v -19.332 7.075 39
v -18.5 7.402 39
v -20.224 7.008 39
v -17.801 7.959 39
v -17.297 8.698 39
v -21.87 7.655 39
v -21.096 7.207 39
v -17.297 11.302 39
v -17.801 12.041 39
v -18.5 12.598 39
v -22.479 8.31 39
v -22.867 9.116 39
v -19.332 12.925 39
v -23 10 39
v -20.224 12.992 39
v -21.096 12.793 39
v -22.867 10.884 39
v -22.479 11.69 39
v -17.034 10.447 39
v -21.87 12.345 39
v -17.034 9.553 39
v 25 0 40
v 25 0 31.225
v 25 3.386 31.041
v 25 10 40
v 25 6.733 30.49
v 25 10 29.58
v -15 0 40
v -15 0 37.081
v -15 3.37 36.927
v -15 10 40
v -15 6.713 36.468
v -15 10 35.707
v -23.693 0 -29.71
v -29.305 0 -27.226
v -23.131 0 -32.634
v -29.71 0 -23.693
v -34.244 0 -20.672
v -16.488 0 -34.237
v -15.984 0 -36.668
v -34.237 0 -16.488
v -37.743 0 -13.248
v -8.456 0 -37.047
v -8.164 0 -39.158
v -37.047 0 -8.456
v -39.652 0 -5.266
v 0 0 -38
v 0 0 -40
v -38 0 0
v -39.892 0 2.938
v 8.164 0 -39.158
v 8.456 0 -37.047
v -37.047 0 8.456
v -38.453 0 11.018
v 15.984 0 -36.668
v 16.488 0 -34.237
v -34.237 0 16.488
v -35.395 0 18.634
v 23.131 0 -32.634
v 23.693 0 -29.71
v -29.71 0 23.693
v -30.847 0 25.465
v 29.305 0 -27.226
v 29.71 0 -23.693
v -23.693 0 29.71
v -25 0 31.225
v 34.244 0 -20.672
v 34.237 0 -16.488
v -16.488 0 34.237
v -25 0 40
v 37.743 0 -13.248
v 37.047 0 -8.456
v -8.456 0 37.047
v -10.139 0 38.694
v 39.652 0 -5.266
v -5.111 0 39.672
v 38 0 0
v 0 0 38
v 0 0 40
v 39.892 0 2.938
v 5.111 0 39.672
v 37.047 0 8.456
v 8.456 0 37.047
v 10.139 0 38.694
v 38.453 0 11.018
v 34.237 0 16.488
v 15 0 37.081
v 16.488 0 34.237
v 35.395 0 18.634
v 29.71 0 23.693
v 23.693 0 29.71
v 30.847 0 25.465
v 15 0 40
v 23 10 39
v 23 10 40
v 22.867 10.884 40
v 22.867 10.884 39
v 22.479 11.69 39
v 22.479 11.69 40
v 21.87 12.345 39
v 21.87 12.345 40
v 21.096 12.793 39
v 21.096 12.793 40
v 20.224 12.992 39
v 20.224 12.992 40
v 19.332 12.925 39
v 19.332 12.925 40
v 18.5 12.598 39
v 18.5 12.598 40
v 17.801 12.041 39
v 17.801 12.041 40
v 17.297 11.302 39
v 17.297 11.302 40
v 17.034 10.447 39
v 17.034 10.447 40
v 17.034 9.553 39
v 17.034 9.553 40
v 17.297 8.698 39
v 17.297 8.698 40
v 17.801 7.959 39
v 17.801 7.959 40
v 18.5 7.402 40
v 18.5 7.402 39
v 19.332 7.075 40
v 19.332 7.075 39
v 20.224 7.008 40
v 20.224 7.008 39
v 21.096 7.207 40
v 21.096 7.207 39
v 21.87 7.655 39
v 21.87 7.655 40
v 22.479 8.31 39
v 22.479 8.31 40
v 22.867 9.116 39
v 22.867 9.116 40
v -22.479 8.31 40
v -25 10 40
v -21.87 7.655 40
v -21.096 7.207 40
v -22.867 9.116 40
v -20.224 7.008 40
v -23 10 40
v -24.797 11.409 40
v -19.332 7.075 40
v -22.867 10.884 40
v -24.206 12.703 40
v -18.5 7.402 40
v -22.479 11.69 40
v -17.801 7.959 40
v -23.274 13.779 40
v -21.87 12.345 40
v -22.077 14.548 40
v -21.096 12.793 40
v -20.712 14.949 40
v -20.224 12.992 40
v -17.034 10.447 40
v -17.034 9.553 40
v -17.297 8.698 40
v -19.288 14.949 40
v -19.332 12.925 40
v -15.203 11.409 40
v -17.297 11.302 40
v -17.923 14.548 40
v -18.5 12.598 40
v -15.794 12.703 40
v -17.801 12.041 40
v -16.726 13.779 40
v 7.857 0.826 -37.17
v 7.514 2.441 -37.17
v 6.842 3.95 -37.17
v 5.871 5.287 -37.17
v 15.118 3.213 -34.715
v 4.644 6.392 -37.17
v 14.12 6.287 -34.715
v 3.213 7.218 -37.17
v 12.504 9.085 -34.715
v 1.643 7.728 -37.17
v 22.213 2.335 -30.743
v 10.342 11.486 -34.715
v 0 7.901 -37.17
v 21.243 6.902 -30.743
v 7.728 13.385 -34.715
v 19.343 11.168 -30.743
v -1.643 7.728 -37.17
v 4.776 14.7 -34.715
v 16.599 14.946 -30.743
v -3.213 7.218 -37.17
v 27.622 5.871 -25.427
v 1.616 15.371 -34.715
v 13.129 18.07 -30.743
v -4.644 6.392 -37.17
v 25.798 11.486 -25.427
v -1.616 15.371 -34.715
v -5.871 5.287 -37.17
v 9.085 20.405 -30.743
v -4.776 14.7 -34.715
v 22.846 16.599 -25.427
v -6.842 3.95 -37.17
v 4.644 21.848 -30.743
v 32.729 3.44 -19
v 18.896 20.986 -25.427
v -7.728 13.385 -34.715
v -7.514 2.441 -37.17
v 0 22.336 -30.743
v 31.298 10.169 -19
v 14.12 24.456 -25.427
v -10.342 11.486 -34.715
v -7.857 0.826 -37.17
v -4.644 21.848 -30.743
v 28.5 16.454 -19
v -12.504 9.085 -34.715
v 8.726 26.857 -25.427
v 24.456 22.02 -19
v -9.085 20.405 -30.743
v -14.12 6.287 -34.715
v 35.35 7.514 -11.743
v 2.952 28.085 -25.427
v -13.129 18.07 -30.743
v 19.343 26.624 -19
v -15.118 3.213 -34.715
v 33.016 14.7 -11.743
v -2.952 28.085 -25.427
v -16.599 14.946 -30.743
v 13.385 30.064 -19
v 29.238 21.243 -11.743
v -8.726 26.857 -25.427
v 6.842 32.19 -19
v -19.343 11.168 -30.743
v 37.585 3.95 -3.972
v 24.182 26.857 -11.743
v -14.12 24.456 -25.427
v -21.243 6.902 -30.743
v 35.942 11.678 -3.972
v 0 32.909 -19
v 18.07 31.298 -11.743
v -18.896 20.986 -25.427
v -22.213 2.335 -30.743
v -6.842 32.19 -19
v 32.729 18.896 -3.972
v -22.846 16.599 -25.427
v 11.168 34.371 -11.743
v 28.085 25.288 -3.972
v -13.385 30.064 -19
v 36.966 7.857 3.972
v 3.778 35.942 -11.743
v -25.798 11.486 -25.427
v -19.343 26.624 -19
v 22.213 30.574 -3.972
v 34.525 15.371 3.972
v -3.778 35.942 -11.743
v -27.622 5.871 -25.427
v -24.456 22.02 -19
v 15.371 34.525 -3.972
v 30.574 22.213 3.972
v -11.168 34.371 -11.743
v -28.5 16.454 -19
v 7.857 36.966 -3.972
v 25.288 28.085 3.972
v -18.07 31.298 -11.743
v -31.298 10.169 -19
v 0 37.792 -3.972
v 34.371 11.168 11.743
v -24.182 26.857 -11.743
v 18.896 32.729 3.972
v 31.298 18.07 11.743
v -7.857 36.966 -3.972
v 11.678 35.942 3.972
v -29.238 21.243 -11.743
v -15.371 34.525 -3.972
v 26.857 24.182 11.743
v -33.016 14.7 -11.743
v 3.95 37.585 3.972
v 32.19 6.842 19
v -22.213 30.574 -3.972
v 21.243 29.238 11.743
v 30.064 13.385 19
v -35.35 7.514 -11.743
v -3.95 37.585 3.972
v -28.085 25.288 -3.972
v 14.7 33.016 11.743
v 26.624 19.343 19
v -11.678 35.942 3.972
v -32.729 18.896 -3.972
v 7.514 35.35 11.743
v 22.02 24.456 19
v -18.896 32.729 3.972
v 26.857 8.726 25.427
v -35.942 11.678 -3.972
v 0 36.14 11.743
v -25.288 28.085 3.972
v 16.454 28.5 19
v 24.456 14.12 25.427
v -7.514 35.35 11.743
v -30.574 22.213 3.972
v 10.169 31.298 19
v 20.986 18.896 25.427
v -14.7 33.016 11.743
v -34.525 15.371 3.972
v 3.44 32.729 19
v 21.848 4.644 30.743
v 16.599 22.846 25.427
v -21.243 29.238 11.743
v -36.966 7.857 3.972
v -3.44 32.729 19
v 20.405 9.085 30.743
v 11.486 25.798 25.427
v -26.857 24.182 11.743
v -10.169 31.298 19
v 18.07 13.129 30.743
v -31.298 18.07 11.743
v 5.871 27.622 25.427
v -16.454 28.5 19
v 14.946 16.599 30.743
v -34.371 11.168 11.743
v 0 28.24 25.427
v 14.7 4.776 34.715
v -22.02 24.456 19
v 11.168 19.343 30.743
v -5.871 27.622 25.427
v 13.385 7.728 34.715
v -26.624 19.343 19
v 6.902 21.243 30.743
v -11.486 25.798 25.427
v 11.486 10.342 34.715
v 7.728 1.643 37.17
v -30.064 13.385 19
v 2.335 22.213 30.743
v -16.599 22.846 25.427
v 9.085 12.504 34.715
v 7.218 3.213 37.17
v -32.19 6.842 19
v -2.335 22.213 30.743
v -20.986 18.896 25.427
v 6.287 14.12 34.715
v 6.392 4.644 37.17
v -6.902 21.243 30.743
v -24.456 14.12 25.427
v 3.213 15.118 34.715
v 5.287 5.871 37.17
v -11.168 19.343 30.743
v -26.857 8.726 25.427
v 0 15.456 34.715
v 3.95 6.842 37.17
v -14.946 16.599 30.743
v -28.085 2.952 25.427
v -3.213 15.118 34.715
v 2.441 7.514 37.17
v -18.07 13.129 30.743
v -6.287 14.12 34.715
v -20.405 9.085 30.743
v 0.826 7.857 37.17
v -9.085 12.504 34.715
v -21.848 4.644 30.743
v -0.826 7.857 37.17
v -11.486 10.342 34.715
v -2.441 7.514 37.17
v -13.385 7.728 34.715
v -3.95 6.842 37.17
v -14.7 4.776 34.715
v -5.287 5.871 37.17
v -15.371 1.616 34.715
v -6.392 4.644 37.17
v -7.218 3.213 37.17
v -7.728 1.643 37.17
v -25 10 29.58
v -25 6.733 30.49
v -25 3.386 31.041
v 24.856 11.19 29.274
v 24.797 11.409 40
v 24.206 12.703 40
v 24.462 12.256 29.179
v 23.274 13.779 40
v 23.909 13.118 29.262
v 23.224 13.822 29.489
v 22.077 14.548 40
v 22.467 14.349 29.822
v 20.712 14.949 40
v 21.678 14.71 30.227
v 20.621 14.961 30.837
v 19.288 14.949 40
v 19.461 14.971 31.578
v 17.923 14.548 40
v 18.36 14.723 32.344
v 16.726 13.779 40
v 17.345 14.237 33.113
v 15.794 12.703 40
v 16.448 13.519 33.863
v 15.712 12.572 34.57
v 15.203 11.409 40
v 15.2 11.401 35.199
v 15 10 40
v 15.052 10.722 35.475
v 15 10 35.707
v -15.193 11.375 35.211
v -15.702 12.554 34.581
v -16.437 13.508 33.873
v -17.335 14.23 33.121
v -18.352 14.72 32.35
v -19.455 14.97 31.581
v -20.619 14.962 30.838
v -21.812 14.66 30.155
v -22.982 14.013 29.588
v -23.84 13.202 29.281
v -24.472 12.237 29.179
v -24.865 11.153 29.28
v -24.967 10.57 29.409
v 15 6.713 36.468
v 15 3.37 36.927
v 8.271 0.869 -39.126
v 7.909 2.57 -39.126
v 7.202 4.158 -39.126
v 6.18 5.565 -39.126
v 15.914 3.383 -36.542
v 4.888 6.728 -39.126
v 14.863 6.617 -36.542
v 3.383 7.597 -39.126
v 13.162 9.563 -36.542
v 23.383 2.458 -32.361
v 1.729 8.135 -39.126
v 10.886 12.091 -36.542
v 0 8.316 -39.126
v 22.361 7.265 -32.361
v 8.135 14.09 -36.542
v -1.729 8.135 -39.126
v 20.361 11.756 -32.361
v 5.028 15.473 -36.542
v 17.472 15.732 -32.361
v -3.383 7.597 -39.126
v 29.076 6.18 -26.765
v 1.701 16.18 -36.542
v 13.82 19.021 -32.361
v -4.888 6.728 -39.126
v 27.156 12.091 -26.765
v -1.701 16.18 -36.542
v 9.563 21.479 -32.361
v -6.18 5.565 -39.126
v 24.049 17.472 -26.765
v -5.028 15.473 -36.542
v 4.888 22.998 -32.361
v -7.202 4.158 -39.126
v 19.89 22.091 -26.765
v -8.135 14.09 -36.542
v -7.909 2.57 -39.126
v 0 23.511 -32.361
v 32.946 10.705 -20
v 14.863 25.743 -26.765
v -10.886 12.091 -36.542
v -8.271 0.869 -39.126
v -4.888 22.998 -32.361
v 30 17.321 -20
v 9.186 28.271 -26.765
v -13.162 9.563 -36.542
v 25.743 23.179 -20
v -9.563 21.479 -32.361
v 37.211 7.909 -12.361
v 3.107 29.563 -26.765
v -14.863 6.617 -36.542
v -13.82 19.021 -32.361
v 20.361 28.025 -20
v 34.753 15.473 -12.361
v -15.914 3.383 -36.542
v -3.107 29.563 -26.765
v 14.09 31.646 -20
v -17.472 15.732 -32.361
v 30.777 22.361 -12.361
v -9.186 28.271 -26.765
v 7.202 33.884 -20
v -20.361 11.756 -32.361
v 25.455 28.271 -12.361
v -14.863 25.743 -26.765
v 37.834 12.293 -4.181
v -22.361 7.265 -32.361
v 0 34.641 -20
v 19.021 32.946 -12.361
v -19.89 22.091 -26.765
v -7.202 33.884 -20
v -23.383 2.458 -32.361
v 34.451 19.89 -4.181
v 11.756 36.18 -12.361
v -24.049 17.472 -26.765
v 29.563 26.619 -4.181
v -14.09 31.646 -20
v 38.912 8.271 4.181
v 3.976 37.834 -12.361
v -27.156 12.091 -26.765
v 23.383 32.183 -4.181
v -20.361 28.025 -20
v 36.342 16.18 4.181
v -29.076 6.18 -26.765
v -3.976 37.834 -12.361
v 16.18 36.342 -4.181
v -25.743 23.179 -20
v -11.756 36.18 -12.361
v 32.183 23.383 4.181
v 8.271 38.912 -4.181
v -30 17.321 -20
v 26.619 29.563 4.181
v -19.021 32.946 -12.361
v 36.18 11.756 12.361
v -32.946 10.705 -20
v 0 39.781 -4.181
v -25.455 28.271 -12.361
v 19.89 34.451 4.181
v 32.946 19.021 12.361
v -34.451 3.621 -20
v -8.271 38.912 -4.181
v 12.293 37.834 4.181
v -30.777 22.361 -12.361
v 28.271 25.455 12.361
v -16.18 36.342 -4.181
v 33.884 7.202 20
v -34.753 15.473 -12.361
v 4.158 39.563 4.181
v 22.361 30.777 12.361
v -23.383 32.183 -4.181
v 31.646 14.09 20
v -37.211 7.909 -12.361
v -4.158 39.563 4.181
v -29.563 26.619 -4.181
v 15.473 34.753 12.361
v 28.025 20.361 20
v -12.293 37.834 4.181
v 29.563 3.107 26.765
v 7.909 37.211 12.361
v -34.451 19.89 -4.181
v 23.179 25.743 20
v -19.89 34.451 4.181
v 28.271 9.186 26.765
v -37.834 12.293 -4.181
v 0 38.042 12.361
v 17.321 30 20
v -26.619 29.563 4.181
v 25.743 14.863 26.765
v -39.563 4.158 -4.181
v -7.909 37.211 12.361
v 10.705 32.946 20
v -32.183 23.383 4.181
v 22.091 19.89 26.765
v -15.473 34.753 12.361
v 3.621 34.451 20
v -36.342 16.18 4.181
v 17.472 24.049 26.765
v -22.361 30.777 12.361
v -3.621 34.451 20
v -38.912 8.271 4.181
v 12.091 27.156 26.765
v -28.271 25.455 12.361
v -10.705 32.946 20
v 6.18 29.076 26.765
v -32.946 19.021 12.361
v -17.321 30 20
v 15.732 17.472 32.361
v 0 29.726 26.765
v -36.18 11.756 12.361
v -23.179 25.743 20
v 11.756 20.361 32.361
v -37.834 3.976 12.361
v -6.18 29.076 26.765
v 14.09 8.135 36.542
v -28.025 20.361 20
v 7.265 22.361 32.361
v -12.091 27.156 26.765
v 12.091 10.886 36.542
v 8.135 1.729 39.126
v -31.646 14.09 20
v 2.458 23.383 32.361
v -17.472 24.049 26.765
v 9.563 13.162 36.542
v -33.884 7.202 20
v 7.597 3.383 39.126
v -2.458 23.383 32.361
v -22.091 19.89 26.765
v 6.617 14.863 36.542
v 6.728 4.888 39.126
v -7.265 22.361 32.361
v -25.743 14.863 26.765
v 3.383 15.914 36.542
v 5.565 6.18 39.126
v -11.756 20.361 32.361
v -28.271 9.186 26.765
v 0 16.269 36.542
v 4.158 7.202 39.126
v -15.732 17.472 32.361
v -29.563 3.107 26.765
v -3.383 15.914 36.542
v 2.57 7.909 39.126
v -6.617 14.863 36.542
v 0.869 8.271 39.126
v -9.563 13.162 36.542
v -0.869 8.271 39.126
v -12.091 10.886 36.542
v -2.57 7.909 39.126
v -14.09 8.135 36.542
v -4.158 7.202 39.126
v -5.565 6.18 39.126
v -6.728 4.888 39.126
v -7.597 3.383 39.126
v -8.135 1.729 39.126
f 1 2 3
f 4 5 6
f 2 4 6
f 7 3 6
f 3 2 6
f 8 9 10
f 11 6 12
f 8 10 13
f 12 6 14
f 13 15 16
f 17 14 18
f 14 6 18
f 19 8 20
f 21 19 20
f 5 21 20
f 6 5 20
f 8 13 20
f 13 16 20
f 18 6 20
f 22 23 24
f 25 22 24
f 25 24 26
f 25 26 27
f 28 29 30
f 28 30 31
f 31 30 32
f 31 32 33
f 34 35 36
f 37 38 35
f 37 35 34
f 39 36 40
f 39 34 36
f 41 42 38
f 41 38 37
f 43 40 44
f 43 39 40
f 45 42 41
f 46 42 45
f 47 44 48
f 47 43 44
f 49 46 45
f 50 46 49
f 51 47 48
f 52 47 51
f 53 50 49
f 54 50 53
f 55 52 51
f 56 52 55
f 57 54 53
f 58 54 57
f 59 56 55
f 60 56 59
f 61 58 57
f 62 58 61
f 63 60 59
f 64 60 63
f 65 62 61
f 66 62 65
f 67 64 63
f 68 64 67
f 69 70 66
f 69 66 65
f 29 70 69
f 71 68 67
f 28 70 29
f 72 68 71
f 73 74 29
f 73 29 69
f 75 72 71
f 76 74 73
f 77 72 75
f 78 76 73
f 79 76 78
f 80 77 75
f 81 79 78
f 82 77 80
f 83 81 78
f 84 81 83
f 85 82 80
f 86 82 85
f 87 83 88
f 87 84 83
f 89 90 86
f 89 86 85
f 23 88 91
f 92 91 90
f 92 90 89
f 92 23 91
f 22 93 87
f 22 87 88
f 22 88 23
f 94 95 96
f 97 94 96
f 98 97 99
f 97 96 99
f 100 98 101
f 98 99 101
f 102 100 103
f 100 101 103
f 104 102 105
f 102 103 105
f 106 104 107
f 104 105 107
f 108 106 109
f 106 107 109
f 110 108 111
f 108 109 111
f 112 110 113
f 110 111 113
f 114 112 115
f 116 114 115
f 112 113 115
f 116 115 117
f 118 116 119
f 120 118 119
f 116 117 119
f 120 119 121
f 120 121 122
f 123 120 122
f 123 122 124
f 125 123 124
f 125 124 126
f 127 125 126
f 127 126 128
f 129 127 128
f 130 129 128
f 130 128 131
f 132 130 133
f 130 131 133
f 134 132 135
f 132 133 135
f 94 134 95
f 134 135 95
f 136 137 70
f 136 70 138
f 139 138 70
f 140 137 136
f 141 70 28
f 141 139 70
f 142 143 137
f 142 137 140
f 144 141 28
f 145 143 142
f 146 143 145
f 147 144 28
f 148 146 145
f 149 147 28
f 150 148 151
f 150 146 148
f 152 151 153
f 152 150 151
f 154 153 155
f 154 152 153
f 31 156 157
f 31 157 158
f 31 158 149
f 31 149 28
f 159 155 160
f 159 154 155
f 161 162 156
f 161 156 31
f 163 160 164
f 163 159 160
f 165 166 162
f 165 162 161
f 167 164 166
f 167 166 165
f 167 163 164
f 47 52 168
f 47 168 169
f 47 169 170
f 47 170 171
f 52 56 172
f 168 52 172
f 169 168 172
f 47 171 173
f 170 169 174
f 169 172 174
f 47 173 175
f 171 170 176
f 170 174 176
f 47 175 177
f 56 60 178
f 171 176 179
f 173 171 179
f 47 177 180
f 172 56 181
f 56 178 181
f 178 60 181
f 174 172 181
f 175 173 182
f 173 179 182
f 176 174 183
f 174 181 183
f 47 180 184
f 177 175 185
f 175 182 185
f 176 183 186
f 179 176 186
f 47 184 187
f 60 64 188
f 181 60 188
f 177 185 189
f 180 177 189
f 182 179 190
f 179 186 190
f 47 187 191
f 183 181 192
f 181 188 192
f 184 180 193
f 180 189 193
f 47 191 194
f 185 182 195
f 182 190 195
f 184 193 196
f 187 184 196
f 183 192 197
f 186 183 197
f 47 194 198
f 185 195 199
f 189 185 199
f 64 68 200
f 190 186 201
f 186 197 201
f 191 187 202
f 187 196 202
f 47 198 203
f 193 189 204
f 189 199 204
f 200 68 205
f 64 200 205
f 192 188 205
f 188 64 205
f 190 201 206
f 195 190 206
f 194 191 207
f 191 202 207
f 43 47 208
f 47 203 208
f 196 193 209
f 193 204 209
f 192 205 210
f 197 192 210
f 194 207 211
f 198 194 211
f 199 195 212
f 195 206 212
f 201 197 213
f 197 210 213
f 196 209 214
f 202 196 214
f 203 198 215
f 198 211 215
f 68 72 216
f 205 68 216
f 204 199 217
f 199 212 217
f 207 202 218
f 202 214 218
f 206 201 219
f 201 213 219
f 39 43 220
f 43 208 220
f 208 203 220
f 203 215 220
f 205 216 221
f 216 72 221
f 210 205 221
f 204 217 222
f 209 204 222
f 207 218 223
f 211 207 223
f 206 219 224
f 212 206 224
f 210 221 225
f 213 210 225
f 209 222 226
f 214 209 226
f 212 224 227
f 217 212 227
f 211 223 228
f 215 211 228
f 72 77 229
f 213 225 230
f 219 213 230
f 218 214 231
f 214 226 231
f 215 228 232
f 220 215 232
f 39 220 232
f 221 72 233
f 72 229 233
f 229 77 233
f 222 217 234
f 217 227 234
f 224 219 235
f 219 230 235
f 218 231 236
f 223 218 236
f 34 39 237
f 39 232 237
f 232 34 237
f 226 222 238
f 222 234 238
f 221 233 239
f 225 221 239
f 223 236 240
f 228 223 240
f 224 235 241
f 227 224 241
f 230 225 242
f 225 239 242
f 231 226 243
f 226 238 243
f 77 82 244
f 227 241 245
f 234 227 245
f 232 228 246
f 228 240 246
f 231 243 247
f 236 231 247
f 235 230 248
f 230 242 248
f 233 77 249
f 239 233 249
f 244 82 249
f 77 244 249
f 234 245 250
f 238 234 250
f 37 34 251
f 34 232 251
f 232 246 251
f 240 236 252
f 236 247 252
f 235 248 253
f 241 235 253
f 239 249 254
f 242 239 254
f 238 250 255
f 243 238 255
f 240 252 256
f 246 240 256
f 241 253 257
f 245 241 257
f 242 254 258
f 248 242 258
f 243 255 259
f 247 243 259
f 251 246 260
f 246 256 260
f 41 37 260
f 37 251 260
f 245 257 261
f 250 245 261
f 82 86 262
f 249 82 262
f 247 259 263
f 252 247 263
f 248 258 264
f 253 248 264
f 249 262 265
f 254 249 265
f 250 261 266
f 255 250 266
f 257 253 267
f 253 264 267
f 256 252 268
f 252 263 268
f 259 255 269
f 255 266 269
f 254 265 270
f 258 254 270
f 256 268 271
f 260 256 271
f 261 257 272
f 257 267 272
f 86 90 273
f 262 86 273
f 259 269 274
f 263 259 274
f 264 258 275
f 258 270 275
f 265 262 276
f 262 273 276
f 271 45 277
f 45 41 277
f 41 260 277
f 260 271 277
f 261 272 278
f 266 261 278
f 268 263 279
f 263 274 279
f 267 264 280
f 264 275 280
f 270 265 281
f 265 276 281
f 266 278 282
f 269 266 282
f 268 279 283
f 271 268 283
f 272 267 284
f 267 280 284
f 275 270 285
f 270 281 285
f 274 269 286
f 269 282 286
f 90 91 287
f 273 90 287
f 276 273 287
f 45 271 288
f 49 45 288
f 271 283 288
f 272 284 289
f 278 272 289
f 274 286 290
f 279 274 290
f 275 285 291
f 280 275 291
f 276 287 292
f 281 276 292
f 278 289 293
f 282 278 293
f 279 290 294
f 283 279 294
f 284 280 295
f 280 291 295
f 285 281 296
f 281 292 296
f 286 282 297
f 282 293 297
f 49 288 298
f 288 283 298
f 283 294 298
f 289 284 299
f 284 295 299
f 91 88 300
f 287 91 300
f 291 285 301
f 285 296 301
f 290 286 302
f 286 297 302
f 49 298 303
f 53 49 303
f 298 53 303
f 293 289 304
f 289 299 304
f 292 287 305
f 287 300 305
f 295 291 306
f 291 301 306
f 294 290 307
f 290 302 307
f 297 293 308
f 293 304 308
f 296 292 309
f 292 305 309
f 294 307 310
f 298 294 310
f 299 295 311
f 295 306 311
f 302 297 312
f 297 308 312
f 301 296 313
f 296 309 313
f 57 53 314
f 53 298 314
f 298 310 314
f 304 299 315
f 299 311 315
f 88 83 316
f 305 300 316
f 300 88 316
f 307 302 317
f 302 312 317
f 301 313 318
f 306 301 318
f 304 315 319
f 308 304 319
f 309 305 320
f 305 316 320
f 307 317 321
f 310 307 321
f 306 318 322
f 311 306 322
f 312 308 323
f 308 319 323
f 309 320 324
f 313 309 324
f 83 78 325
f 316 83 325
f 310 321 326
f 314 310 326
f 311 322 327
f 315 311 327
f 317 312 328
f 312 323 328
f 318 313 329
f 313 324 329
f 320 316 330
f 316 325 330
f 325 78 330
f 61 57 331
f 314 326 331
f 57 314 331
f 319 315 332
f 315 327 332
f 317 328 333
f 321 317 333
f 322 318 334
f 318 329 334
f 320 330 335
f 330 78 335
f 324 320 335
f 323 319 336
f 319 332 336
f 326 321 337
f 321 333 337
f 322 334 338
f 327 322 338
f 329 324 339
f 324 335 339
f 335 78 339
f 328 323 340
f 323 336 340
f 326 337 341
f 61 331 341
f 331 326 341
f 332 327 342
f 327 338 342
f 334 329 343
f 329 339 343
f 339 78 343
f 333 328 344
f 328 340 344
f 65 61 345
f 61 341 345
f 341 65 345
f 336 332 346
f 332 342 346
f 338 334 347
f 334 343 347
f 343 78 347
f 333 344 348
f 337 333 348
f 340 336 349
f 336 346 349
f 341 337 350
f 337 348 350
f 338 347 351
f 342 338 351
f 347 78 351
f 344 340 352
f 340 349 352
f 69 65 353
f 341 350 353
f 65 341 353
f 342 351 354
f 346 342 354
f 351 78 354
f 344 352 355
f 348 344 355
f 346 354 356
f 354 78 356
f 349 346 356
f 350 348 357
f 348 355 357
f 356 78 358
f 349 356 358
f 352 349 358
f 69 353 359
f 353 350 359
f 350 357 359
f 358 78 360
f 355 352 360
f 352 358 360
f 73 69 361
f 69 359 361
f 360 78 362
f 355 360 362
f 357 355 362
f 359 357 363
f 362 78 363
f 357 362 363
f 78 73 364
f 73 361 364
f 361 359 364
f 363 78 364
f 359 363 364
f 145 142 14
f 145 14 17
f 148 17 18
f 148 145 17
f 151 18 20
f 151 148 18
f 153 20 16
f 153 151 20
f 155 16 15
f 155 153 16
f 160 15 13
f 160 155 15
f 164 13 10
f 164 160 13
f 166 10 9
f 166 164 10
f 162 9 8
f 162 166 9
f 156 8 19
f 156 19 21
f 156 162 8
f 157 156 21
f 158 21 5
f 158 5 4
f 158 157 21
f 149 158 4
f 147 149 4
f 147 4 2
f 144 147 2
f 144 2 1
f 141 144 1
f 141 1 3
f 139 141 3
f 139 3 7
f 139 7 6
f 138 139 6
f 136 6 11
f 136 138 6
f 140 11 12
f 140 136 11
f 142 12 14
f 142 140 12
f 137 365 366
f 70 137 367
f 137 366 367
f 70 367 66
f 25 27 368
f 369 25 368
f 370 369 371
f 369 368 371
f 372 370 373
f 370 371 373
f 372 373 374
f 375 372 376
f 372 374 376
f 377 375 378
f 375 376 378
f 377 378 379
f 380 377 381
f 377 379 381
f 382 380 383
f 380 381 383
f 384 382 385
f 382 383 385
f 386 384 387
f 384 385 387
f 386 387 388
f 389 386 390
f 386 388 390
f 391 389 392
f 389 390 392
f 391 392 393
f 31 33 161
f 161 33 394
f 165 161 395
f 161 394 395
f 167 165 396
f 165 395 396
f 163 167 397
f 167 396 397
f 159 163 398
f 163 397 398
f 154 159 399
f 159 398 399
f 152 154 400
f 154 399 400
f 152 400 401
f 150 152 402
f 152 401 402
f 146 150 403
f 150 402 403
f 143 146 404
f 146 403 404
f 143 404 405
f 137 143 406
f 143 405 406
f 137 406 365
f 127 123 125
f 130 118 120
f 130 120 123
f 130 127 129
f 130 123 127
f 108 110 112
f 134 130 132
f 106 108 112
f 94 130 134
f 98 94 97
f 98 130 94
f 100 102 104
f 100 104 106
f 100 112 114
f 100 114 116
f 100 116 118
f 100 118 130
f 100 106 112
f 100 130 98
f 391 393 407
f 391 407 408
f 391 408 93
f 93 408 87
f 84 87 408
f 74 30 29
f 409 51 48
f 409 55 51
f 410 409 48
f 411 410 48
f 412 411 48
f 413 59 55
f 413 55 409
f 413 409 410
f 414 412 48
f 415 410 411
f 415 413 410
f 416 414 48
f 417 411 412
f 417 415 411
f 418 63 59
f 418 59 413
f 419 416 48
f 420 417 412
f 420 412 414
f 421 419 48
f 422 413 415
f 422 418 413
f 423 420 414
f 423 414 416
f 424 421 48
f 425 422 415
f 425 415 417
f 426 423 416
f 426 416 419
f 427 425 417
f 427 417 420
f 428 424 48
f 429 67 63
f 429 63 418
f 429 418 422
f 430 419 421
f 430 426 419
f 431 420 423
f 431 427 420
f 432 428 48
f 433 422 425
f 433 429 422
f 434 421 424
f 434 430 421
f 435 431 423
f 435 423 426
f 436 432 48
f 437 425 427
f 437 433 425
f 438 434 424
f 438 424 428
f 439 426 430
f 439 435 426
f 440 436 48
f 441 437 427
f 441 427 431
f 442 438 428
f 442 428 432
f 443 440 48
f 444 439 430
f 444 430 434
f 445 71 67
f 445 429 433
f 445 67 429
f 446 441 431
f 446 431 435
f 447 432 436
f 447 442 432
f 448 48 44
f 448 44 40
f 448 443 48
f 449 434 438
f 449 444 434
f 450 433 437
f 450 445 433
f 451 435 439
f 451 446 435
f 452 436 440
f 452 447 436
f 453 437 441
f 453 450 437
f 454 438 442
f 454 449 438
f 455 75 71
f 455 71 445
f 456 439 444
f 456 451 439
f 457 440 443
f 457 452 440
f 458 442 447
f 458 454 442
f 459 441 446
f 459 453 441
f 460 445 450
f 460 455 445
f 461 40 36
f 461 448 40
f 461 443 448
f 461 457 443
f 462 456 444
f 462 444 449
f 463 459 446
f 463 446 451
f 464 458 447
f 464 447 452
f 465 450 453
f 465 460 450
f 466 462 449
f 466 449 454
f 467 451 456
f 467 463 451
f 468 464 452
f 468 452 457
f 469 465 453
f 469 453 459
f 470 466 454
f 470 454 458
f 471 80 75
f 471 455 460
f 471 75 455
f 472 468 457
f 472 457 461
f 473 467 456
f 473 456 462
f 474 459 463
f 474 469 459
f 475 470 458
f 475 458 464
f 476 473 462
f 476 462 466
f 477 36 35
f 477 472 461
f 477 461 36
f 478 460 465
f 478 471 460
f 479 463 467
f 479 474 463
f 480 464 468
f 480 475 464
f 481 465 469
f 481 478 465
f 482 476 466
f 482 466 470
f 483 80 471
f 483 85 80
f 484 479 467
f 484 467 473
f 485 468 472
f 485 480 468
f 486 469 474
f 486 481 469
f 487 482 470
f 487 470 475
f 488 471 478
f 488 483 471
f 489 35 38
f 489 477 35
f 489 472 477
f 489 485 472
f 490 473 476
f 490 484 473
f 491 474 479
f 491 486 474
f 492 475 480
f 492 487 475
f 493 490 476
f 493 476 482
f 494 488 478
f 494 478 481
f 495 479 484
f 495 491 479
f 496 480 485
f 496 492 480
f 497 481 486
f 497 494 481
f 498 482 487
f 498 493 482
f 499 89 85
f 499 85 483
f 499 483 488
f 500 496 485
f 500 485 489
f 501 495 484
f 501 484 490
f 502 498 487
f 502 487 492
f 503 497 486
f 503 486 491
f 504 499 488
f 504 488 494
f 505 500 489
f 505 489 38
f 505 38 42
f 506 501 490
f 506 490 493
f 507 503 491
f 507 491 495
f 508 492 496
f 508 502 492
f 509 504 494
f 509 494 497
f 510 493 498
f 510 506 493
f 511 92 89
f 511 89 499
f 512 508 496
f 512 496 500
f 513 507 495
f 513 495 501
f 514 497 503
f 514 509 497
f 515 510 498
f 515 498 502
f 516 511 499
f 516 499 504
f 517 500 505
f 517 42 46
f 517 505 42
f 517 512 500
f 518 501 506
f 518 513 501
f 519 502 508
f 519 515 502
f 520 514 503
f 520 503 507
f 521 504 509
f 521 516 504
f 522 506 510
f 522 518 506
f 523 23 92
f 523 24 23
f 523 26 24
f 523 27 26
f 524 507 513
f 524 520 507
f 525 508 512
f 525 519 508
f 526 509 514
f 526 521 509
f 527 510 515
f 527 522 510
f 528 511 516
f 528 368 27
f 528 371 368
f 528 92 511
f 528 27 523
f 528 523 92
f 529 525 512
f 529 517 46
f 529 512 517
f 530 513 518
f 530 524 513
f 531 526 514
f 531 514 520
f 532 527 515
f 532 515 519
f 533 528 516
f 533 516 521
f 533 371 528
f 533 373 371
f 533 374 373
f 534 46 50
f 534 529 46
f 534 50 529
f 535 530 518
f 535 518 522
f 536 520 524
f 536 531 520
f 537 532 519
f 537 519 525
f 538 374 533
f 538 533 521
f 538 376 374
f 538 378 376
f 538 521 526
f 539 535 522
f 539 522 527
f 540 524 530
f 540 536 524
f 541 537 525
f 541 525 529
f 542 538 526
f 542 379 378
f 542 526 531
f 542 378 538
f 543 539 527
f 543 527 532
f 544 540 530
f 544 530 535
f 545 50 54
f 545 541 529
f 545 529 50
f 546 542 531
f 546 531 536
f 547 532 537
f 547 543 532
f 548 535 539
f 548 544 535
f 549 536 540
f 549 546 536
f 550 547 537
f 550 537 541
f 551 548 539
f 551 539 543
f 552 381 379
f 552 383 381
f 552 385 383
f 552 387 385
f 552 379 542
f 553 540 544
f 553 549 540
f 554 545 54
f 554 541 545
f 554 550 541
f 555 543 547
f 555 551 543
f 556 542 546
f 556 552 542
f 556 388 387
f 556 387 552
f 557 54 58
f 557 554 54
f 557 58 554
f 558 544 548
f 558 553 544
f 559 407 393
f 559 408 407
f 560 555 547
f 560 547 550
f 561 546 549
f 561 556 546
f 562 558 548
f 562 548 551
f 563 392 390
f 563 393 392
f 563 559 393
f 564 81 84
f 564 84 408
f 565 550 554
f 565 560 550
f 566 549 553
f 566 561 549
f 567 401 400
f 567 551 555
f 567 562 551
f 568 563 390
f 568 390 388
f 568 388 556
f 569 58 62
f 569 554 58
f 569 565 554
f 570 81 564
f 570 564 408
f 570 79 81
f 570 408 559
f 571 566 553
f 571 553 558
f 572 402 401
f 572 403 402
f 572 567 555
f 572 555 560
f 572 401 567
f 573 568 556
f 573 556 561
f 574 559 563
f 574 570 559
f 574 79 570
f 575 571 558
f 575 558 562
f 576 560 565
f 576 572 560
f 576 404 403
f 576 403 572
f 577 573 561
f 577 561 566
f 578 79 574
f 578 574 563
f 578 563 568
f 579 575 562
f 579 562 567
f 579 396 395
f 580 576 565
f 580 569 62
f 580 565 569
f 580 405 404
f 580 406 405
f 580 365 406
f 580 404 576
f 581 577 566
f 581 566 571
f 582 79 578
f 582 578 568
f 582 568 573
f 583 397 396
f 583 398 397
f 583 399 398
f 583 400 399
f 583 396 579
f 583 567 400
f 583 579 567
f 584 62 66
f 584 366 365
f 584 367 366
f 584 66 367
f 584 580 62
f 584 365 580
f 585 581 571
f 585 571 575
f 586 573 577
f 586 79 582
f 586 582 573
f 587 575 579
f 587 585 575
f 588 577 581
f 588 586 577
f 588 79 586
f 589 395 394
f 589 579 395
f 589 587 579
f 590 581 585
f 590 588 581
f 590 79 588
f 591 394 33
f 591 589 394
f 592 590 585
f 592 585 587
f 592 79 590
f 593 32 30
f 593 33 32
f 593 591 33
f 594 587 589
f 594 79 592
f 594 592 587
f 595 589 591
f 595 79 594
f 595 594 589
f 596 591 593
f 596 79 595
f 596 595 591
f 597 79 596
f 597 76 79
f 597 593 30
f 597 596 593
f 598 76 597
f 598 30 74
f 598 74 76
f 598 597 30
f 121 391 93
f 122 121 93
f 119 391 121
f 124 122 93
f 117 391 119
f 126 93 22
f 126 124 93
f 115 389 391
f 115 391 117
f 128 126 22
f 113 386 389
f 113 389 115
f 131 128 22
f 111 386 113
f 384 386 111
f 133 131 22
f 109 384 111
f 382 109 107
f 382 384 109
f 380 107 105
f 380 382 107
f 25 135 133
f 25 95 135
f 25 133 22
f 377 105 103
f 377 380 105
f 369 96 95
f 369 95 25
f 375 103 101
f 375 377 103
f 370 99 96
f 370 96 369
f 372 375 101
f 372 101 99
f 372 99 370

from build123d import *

# Parameters (mm, degrees)
F1_ANGLE = 180
F3_DEPTH = 40
F6_R     = 3
F7_DEPTH = 1


# Not quite as in the source:
# - a pattern or mirror of a feature is missing from the dataset's text; its kind, count and spacing are read off the source's solid


with BuildPart() as f1:
    # F0 (on Front) → F1 (revolve)
    with BuildSketch(Plane.XZ):
        with BuildLine():
            Line((0, 0), (0, -40))
            ThreePointArc((0, -40), (40, 0), (0, 40))
            Line((0, 40), (0, 0))
        make_face()
    revolve(axis=Axis((0, 0, 20), (0, 0, 1)), revolution_arc=F1_ANGLE)

    # F2 (on Top) → F3 (join)
    with BuildSketch(Plane.XY):
        with BuildLine():
            Line((-25, 0), (-15, 0))
            Line((-15, 0), (-15, 10))
            ThreePointArc((-15, 10), (-20, 15), (-25, 10))
            Line((-25, 10), (-25, 0))
        make_face()
        with BuildLine():
            Line((15, 10), (15, 0))
            Line((15, 0), (25, 0))
            Line((25, 0), (25, 10))
            ThreePointArc((25, 10), (20, 15), (15, 10))
        make_face()
    extrude(amount=F3_DEPTH)

    # F4 (on face) → F5 (revolve, cut)
    with BuildSketch(Plane.XZ):
        with BuildLine():
            Line((0, 38), (0, -38))
            ThreePointArc((0, -38), (38, 0), (0, 38))
        make_face()
    revolve(axis=Axis((0, 0, 0), (0, 0, 1)), mode=Mode.SUBTRACT)

    # F6 (on face) → F7 (cut)
    with BuildSketch(Plane.XY.offset(40)):
        with Locations((20, 10)):
            Circle(F6_R)
    f7 = extrude(amount=-F7_DEPTH, mode=Mode.SUBTRACT)

    # F7_copies: F7 across plane
    add(f7.mirror(Plane(origin=(0, 0, 0), x_dir=(0, 0, -1), z_dir=(-1, 0, 0))), mode=Mode.SUBTRACT)


solid = f1.part
